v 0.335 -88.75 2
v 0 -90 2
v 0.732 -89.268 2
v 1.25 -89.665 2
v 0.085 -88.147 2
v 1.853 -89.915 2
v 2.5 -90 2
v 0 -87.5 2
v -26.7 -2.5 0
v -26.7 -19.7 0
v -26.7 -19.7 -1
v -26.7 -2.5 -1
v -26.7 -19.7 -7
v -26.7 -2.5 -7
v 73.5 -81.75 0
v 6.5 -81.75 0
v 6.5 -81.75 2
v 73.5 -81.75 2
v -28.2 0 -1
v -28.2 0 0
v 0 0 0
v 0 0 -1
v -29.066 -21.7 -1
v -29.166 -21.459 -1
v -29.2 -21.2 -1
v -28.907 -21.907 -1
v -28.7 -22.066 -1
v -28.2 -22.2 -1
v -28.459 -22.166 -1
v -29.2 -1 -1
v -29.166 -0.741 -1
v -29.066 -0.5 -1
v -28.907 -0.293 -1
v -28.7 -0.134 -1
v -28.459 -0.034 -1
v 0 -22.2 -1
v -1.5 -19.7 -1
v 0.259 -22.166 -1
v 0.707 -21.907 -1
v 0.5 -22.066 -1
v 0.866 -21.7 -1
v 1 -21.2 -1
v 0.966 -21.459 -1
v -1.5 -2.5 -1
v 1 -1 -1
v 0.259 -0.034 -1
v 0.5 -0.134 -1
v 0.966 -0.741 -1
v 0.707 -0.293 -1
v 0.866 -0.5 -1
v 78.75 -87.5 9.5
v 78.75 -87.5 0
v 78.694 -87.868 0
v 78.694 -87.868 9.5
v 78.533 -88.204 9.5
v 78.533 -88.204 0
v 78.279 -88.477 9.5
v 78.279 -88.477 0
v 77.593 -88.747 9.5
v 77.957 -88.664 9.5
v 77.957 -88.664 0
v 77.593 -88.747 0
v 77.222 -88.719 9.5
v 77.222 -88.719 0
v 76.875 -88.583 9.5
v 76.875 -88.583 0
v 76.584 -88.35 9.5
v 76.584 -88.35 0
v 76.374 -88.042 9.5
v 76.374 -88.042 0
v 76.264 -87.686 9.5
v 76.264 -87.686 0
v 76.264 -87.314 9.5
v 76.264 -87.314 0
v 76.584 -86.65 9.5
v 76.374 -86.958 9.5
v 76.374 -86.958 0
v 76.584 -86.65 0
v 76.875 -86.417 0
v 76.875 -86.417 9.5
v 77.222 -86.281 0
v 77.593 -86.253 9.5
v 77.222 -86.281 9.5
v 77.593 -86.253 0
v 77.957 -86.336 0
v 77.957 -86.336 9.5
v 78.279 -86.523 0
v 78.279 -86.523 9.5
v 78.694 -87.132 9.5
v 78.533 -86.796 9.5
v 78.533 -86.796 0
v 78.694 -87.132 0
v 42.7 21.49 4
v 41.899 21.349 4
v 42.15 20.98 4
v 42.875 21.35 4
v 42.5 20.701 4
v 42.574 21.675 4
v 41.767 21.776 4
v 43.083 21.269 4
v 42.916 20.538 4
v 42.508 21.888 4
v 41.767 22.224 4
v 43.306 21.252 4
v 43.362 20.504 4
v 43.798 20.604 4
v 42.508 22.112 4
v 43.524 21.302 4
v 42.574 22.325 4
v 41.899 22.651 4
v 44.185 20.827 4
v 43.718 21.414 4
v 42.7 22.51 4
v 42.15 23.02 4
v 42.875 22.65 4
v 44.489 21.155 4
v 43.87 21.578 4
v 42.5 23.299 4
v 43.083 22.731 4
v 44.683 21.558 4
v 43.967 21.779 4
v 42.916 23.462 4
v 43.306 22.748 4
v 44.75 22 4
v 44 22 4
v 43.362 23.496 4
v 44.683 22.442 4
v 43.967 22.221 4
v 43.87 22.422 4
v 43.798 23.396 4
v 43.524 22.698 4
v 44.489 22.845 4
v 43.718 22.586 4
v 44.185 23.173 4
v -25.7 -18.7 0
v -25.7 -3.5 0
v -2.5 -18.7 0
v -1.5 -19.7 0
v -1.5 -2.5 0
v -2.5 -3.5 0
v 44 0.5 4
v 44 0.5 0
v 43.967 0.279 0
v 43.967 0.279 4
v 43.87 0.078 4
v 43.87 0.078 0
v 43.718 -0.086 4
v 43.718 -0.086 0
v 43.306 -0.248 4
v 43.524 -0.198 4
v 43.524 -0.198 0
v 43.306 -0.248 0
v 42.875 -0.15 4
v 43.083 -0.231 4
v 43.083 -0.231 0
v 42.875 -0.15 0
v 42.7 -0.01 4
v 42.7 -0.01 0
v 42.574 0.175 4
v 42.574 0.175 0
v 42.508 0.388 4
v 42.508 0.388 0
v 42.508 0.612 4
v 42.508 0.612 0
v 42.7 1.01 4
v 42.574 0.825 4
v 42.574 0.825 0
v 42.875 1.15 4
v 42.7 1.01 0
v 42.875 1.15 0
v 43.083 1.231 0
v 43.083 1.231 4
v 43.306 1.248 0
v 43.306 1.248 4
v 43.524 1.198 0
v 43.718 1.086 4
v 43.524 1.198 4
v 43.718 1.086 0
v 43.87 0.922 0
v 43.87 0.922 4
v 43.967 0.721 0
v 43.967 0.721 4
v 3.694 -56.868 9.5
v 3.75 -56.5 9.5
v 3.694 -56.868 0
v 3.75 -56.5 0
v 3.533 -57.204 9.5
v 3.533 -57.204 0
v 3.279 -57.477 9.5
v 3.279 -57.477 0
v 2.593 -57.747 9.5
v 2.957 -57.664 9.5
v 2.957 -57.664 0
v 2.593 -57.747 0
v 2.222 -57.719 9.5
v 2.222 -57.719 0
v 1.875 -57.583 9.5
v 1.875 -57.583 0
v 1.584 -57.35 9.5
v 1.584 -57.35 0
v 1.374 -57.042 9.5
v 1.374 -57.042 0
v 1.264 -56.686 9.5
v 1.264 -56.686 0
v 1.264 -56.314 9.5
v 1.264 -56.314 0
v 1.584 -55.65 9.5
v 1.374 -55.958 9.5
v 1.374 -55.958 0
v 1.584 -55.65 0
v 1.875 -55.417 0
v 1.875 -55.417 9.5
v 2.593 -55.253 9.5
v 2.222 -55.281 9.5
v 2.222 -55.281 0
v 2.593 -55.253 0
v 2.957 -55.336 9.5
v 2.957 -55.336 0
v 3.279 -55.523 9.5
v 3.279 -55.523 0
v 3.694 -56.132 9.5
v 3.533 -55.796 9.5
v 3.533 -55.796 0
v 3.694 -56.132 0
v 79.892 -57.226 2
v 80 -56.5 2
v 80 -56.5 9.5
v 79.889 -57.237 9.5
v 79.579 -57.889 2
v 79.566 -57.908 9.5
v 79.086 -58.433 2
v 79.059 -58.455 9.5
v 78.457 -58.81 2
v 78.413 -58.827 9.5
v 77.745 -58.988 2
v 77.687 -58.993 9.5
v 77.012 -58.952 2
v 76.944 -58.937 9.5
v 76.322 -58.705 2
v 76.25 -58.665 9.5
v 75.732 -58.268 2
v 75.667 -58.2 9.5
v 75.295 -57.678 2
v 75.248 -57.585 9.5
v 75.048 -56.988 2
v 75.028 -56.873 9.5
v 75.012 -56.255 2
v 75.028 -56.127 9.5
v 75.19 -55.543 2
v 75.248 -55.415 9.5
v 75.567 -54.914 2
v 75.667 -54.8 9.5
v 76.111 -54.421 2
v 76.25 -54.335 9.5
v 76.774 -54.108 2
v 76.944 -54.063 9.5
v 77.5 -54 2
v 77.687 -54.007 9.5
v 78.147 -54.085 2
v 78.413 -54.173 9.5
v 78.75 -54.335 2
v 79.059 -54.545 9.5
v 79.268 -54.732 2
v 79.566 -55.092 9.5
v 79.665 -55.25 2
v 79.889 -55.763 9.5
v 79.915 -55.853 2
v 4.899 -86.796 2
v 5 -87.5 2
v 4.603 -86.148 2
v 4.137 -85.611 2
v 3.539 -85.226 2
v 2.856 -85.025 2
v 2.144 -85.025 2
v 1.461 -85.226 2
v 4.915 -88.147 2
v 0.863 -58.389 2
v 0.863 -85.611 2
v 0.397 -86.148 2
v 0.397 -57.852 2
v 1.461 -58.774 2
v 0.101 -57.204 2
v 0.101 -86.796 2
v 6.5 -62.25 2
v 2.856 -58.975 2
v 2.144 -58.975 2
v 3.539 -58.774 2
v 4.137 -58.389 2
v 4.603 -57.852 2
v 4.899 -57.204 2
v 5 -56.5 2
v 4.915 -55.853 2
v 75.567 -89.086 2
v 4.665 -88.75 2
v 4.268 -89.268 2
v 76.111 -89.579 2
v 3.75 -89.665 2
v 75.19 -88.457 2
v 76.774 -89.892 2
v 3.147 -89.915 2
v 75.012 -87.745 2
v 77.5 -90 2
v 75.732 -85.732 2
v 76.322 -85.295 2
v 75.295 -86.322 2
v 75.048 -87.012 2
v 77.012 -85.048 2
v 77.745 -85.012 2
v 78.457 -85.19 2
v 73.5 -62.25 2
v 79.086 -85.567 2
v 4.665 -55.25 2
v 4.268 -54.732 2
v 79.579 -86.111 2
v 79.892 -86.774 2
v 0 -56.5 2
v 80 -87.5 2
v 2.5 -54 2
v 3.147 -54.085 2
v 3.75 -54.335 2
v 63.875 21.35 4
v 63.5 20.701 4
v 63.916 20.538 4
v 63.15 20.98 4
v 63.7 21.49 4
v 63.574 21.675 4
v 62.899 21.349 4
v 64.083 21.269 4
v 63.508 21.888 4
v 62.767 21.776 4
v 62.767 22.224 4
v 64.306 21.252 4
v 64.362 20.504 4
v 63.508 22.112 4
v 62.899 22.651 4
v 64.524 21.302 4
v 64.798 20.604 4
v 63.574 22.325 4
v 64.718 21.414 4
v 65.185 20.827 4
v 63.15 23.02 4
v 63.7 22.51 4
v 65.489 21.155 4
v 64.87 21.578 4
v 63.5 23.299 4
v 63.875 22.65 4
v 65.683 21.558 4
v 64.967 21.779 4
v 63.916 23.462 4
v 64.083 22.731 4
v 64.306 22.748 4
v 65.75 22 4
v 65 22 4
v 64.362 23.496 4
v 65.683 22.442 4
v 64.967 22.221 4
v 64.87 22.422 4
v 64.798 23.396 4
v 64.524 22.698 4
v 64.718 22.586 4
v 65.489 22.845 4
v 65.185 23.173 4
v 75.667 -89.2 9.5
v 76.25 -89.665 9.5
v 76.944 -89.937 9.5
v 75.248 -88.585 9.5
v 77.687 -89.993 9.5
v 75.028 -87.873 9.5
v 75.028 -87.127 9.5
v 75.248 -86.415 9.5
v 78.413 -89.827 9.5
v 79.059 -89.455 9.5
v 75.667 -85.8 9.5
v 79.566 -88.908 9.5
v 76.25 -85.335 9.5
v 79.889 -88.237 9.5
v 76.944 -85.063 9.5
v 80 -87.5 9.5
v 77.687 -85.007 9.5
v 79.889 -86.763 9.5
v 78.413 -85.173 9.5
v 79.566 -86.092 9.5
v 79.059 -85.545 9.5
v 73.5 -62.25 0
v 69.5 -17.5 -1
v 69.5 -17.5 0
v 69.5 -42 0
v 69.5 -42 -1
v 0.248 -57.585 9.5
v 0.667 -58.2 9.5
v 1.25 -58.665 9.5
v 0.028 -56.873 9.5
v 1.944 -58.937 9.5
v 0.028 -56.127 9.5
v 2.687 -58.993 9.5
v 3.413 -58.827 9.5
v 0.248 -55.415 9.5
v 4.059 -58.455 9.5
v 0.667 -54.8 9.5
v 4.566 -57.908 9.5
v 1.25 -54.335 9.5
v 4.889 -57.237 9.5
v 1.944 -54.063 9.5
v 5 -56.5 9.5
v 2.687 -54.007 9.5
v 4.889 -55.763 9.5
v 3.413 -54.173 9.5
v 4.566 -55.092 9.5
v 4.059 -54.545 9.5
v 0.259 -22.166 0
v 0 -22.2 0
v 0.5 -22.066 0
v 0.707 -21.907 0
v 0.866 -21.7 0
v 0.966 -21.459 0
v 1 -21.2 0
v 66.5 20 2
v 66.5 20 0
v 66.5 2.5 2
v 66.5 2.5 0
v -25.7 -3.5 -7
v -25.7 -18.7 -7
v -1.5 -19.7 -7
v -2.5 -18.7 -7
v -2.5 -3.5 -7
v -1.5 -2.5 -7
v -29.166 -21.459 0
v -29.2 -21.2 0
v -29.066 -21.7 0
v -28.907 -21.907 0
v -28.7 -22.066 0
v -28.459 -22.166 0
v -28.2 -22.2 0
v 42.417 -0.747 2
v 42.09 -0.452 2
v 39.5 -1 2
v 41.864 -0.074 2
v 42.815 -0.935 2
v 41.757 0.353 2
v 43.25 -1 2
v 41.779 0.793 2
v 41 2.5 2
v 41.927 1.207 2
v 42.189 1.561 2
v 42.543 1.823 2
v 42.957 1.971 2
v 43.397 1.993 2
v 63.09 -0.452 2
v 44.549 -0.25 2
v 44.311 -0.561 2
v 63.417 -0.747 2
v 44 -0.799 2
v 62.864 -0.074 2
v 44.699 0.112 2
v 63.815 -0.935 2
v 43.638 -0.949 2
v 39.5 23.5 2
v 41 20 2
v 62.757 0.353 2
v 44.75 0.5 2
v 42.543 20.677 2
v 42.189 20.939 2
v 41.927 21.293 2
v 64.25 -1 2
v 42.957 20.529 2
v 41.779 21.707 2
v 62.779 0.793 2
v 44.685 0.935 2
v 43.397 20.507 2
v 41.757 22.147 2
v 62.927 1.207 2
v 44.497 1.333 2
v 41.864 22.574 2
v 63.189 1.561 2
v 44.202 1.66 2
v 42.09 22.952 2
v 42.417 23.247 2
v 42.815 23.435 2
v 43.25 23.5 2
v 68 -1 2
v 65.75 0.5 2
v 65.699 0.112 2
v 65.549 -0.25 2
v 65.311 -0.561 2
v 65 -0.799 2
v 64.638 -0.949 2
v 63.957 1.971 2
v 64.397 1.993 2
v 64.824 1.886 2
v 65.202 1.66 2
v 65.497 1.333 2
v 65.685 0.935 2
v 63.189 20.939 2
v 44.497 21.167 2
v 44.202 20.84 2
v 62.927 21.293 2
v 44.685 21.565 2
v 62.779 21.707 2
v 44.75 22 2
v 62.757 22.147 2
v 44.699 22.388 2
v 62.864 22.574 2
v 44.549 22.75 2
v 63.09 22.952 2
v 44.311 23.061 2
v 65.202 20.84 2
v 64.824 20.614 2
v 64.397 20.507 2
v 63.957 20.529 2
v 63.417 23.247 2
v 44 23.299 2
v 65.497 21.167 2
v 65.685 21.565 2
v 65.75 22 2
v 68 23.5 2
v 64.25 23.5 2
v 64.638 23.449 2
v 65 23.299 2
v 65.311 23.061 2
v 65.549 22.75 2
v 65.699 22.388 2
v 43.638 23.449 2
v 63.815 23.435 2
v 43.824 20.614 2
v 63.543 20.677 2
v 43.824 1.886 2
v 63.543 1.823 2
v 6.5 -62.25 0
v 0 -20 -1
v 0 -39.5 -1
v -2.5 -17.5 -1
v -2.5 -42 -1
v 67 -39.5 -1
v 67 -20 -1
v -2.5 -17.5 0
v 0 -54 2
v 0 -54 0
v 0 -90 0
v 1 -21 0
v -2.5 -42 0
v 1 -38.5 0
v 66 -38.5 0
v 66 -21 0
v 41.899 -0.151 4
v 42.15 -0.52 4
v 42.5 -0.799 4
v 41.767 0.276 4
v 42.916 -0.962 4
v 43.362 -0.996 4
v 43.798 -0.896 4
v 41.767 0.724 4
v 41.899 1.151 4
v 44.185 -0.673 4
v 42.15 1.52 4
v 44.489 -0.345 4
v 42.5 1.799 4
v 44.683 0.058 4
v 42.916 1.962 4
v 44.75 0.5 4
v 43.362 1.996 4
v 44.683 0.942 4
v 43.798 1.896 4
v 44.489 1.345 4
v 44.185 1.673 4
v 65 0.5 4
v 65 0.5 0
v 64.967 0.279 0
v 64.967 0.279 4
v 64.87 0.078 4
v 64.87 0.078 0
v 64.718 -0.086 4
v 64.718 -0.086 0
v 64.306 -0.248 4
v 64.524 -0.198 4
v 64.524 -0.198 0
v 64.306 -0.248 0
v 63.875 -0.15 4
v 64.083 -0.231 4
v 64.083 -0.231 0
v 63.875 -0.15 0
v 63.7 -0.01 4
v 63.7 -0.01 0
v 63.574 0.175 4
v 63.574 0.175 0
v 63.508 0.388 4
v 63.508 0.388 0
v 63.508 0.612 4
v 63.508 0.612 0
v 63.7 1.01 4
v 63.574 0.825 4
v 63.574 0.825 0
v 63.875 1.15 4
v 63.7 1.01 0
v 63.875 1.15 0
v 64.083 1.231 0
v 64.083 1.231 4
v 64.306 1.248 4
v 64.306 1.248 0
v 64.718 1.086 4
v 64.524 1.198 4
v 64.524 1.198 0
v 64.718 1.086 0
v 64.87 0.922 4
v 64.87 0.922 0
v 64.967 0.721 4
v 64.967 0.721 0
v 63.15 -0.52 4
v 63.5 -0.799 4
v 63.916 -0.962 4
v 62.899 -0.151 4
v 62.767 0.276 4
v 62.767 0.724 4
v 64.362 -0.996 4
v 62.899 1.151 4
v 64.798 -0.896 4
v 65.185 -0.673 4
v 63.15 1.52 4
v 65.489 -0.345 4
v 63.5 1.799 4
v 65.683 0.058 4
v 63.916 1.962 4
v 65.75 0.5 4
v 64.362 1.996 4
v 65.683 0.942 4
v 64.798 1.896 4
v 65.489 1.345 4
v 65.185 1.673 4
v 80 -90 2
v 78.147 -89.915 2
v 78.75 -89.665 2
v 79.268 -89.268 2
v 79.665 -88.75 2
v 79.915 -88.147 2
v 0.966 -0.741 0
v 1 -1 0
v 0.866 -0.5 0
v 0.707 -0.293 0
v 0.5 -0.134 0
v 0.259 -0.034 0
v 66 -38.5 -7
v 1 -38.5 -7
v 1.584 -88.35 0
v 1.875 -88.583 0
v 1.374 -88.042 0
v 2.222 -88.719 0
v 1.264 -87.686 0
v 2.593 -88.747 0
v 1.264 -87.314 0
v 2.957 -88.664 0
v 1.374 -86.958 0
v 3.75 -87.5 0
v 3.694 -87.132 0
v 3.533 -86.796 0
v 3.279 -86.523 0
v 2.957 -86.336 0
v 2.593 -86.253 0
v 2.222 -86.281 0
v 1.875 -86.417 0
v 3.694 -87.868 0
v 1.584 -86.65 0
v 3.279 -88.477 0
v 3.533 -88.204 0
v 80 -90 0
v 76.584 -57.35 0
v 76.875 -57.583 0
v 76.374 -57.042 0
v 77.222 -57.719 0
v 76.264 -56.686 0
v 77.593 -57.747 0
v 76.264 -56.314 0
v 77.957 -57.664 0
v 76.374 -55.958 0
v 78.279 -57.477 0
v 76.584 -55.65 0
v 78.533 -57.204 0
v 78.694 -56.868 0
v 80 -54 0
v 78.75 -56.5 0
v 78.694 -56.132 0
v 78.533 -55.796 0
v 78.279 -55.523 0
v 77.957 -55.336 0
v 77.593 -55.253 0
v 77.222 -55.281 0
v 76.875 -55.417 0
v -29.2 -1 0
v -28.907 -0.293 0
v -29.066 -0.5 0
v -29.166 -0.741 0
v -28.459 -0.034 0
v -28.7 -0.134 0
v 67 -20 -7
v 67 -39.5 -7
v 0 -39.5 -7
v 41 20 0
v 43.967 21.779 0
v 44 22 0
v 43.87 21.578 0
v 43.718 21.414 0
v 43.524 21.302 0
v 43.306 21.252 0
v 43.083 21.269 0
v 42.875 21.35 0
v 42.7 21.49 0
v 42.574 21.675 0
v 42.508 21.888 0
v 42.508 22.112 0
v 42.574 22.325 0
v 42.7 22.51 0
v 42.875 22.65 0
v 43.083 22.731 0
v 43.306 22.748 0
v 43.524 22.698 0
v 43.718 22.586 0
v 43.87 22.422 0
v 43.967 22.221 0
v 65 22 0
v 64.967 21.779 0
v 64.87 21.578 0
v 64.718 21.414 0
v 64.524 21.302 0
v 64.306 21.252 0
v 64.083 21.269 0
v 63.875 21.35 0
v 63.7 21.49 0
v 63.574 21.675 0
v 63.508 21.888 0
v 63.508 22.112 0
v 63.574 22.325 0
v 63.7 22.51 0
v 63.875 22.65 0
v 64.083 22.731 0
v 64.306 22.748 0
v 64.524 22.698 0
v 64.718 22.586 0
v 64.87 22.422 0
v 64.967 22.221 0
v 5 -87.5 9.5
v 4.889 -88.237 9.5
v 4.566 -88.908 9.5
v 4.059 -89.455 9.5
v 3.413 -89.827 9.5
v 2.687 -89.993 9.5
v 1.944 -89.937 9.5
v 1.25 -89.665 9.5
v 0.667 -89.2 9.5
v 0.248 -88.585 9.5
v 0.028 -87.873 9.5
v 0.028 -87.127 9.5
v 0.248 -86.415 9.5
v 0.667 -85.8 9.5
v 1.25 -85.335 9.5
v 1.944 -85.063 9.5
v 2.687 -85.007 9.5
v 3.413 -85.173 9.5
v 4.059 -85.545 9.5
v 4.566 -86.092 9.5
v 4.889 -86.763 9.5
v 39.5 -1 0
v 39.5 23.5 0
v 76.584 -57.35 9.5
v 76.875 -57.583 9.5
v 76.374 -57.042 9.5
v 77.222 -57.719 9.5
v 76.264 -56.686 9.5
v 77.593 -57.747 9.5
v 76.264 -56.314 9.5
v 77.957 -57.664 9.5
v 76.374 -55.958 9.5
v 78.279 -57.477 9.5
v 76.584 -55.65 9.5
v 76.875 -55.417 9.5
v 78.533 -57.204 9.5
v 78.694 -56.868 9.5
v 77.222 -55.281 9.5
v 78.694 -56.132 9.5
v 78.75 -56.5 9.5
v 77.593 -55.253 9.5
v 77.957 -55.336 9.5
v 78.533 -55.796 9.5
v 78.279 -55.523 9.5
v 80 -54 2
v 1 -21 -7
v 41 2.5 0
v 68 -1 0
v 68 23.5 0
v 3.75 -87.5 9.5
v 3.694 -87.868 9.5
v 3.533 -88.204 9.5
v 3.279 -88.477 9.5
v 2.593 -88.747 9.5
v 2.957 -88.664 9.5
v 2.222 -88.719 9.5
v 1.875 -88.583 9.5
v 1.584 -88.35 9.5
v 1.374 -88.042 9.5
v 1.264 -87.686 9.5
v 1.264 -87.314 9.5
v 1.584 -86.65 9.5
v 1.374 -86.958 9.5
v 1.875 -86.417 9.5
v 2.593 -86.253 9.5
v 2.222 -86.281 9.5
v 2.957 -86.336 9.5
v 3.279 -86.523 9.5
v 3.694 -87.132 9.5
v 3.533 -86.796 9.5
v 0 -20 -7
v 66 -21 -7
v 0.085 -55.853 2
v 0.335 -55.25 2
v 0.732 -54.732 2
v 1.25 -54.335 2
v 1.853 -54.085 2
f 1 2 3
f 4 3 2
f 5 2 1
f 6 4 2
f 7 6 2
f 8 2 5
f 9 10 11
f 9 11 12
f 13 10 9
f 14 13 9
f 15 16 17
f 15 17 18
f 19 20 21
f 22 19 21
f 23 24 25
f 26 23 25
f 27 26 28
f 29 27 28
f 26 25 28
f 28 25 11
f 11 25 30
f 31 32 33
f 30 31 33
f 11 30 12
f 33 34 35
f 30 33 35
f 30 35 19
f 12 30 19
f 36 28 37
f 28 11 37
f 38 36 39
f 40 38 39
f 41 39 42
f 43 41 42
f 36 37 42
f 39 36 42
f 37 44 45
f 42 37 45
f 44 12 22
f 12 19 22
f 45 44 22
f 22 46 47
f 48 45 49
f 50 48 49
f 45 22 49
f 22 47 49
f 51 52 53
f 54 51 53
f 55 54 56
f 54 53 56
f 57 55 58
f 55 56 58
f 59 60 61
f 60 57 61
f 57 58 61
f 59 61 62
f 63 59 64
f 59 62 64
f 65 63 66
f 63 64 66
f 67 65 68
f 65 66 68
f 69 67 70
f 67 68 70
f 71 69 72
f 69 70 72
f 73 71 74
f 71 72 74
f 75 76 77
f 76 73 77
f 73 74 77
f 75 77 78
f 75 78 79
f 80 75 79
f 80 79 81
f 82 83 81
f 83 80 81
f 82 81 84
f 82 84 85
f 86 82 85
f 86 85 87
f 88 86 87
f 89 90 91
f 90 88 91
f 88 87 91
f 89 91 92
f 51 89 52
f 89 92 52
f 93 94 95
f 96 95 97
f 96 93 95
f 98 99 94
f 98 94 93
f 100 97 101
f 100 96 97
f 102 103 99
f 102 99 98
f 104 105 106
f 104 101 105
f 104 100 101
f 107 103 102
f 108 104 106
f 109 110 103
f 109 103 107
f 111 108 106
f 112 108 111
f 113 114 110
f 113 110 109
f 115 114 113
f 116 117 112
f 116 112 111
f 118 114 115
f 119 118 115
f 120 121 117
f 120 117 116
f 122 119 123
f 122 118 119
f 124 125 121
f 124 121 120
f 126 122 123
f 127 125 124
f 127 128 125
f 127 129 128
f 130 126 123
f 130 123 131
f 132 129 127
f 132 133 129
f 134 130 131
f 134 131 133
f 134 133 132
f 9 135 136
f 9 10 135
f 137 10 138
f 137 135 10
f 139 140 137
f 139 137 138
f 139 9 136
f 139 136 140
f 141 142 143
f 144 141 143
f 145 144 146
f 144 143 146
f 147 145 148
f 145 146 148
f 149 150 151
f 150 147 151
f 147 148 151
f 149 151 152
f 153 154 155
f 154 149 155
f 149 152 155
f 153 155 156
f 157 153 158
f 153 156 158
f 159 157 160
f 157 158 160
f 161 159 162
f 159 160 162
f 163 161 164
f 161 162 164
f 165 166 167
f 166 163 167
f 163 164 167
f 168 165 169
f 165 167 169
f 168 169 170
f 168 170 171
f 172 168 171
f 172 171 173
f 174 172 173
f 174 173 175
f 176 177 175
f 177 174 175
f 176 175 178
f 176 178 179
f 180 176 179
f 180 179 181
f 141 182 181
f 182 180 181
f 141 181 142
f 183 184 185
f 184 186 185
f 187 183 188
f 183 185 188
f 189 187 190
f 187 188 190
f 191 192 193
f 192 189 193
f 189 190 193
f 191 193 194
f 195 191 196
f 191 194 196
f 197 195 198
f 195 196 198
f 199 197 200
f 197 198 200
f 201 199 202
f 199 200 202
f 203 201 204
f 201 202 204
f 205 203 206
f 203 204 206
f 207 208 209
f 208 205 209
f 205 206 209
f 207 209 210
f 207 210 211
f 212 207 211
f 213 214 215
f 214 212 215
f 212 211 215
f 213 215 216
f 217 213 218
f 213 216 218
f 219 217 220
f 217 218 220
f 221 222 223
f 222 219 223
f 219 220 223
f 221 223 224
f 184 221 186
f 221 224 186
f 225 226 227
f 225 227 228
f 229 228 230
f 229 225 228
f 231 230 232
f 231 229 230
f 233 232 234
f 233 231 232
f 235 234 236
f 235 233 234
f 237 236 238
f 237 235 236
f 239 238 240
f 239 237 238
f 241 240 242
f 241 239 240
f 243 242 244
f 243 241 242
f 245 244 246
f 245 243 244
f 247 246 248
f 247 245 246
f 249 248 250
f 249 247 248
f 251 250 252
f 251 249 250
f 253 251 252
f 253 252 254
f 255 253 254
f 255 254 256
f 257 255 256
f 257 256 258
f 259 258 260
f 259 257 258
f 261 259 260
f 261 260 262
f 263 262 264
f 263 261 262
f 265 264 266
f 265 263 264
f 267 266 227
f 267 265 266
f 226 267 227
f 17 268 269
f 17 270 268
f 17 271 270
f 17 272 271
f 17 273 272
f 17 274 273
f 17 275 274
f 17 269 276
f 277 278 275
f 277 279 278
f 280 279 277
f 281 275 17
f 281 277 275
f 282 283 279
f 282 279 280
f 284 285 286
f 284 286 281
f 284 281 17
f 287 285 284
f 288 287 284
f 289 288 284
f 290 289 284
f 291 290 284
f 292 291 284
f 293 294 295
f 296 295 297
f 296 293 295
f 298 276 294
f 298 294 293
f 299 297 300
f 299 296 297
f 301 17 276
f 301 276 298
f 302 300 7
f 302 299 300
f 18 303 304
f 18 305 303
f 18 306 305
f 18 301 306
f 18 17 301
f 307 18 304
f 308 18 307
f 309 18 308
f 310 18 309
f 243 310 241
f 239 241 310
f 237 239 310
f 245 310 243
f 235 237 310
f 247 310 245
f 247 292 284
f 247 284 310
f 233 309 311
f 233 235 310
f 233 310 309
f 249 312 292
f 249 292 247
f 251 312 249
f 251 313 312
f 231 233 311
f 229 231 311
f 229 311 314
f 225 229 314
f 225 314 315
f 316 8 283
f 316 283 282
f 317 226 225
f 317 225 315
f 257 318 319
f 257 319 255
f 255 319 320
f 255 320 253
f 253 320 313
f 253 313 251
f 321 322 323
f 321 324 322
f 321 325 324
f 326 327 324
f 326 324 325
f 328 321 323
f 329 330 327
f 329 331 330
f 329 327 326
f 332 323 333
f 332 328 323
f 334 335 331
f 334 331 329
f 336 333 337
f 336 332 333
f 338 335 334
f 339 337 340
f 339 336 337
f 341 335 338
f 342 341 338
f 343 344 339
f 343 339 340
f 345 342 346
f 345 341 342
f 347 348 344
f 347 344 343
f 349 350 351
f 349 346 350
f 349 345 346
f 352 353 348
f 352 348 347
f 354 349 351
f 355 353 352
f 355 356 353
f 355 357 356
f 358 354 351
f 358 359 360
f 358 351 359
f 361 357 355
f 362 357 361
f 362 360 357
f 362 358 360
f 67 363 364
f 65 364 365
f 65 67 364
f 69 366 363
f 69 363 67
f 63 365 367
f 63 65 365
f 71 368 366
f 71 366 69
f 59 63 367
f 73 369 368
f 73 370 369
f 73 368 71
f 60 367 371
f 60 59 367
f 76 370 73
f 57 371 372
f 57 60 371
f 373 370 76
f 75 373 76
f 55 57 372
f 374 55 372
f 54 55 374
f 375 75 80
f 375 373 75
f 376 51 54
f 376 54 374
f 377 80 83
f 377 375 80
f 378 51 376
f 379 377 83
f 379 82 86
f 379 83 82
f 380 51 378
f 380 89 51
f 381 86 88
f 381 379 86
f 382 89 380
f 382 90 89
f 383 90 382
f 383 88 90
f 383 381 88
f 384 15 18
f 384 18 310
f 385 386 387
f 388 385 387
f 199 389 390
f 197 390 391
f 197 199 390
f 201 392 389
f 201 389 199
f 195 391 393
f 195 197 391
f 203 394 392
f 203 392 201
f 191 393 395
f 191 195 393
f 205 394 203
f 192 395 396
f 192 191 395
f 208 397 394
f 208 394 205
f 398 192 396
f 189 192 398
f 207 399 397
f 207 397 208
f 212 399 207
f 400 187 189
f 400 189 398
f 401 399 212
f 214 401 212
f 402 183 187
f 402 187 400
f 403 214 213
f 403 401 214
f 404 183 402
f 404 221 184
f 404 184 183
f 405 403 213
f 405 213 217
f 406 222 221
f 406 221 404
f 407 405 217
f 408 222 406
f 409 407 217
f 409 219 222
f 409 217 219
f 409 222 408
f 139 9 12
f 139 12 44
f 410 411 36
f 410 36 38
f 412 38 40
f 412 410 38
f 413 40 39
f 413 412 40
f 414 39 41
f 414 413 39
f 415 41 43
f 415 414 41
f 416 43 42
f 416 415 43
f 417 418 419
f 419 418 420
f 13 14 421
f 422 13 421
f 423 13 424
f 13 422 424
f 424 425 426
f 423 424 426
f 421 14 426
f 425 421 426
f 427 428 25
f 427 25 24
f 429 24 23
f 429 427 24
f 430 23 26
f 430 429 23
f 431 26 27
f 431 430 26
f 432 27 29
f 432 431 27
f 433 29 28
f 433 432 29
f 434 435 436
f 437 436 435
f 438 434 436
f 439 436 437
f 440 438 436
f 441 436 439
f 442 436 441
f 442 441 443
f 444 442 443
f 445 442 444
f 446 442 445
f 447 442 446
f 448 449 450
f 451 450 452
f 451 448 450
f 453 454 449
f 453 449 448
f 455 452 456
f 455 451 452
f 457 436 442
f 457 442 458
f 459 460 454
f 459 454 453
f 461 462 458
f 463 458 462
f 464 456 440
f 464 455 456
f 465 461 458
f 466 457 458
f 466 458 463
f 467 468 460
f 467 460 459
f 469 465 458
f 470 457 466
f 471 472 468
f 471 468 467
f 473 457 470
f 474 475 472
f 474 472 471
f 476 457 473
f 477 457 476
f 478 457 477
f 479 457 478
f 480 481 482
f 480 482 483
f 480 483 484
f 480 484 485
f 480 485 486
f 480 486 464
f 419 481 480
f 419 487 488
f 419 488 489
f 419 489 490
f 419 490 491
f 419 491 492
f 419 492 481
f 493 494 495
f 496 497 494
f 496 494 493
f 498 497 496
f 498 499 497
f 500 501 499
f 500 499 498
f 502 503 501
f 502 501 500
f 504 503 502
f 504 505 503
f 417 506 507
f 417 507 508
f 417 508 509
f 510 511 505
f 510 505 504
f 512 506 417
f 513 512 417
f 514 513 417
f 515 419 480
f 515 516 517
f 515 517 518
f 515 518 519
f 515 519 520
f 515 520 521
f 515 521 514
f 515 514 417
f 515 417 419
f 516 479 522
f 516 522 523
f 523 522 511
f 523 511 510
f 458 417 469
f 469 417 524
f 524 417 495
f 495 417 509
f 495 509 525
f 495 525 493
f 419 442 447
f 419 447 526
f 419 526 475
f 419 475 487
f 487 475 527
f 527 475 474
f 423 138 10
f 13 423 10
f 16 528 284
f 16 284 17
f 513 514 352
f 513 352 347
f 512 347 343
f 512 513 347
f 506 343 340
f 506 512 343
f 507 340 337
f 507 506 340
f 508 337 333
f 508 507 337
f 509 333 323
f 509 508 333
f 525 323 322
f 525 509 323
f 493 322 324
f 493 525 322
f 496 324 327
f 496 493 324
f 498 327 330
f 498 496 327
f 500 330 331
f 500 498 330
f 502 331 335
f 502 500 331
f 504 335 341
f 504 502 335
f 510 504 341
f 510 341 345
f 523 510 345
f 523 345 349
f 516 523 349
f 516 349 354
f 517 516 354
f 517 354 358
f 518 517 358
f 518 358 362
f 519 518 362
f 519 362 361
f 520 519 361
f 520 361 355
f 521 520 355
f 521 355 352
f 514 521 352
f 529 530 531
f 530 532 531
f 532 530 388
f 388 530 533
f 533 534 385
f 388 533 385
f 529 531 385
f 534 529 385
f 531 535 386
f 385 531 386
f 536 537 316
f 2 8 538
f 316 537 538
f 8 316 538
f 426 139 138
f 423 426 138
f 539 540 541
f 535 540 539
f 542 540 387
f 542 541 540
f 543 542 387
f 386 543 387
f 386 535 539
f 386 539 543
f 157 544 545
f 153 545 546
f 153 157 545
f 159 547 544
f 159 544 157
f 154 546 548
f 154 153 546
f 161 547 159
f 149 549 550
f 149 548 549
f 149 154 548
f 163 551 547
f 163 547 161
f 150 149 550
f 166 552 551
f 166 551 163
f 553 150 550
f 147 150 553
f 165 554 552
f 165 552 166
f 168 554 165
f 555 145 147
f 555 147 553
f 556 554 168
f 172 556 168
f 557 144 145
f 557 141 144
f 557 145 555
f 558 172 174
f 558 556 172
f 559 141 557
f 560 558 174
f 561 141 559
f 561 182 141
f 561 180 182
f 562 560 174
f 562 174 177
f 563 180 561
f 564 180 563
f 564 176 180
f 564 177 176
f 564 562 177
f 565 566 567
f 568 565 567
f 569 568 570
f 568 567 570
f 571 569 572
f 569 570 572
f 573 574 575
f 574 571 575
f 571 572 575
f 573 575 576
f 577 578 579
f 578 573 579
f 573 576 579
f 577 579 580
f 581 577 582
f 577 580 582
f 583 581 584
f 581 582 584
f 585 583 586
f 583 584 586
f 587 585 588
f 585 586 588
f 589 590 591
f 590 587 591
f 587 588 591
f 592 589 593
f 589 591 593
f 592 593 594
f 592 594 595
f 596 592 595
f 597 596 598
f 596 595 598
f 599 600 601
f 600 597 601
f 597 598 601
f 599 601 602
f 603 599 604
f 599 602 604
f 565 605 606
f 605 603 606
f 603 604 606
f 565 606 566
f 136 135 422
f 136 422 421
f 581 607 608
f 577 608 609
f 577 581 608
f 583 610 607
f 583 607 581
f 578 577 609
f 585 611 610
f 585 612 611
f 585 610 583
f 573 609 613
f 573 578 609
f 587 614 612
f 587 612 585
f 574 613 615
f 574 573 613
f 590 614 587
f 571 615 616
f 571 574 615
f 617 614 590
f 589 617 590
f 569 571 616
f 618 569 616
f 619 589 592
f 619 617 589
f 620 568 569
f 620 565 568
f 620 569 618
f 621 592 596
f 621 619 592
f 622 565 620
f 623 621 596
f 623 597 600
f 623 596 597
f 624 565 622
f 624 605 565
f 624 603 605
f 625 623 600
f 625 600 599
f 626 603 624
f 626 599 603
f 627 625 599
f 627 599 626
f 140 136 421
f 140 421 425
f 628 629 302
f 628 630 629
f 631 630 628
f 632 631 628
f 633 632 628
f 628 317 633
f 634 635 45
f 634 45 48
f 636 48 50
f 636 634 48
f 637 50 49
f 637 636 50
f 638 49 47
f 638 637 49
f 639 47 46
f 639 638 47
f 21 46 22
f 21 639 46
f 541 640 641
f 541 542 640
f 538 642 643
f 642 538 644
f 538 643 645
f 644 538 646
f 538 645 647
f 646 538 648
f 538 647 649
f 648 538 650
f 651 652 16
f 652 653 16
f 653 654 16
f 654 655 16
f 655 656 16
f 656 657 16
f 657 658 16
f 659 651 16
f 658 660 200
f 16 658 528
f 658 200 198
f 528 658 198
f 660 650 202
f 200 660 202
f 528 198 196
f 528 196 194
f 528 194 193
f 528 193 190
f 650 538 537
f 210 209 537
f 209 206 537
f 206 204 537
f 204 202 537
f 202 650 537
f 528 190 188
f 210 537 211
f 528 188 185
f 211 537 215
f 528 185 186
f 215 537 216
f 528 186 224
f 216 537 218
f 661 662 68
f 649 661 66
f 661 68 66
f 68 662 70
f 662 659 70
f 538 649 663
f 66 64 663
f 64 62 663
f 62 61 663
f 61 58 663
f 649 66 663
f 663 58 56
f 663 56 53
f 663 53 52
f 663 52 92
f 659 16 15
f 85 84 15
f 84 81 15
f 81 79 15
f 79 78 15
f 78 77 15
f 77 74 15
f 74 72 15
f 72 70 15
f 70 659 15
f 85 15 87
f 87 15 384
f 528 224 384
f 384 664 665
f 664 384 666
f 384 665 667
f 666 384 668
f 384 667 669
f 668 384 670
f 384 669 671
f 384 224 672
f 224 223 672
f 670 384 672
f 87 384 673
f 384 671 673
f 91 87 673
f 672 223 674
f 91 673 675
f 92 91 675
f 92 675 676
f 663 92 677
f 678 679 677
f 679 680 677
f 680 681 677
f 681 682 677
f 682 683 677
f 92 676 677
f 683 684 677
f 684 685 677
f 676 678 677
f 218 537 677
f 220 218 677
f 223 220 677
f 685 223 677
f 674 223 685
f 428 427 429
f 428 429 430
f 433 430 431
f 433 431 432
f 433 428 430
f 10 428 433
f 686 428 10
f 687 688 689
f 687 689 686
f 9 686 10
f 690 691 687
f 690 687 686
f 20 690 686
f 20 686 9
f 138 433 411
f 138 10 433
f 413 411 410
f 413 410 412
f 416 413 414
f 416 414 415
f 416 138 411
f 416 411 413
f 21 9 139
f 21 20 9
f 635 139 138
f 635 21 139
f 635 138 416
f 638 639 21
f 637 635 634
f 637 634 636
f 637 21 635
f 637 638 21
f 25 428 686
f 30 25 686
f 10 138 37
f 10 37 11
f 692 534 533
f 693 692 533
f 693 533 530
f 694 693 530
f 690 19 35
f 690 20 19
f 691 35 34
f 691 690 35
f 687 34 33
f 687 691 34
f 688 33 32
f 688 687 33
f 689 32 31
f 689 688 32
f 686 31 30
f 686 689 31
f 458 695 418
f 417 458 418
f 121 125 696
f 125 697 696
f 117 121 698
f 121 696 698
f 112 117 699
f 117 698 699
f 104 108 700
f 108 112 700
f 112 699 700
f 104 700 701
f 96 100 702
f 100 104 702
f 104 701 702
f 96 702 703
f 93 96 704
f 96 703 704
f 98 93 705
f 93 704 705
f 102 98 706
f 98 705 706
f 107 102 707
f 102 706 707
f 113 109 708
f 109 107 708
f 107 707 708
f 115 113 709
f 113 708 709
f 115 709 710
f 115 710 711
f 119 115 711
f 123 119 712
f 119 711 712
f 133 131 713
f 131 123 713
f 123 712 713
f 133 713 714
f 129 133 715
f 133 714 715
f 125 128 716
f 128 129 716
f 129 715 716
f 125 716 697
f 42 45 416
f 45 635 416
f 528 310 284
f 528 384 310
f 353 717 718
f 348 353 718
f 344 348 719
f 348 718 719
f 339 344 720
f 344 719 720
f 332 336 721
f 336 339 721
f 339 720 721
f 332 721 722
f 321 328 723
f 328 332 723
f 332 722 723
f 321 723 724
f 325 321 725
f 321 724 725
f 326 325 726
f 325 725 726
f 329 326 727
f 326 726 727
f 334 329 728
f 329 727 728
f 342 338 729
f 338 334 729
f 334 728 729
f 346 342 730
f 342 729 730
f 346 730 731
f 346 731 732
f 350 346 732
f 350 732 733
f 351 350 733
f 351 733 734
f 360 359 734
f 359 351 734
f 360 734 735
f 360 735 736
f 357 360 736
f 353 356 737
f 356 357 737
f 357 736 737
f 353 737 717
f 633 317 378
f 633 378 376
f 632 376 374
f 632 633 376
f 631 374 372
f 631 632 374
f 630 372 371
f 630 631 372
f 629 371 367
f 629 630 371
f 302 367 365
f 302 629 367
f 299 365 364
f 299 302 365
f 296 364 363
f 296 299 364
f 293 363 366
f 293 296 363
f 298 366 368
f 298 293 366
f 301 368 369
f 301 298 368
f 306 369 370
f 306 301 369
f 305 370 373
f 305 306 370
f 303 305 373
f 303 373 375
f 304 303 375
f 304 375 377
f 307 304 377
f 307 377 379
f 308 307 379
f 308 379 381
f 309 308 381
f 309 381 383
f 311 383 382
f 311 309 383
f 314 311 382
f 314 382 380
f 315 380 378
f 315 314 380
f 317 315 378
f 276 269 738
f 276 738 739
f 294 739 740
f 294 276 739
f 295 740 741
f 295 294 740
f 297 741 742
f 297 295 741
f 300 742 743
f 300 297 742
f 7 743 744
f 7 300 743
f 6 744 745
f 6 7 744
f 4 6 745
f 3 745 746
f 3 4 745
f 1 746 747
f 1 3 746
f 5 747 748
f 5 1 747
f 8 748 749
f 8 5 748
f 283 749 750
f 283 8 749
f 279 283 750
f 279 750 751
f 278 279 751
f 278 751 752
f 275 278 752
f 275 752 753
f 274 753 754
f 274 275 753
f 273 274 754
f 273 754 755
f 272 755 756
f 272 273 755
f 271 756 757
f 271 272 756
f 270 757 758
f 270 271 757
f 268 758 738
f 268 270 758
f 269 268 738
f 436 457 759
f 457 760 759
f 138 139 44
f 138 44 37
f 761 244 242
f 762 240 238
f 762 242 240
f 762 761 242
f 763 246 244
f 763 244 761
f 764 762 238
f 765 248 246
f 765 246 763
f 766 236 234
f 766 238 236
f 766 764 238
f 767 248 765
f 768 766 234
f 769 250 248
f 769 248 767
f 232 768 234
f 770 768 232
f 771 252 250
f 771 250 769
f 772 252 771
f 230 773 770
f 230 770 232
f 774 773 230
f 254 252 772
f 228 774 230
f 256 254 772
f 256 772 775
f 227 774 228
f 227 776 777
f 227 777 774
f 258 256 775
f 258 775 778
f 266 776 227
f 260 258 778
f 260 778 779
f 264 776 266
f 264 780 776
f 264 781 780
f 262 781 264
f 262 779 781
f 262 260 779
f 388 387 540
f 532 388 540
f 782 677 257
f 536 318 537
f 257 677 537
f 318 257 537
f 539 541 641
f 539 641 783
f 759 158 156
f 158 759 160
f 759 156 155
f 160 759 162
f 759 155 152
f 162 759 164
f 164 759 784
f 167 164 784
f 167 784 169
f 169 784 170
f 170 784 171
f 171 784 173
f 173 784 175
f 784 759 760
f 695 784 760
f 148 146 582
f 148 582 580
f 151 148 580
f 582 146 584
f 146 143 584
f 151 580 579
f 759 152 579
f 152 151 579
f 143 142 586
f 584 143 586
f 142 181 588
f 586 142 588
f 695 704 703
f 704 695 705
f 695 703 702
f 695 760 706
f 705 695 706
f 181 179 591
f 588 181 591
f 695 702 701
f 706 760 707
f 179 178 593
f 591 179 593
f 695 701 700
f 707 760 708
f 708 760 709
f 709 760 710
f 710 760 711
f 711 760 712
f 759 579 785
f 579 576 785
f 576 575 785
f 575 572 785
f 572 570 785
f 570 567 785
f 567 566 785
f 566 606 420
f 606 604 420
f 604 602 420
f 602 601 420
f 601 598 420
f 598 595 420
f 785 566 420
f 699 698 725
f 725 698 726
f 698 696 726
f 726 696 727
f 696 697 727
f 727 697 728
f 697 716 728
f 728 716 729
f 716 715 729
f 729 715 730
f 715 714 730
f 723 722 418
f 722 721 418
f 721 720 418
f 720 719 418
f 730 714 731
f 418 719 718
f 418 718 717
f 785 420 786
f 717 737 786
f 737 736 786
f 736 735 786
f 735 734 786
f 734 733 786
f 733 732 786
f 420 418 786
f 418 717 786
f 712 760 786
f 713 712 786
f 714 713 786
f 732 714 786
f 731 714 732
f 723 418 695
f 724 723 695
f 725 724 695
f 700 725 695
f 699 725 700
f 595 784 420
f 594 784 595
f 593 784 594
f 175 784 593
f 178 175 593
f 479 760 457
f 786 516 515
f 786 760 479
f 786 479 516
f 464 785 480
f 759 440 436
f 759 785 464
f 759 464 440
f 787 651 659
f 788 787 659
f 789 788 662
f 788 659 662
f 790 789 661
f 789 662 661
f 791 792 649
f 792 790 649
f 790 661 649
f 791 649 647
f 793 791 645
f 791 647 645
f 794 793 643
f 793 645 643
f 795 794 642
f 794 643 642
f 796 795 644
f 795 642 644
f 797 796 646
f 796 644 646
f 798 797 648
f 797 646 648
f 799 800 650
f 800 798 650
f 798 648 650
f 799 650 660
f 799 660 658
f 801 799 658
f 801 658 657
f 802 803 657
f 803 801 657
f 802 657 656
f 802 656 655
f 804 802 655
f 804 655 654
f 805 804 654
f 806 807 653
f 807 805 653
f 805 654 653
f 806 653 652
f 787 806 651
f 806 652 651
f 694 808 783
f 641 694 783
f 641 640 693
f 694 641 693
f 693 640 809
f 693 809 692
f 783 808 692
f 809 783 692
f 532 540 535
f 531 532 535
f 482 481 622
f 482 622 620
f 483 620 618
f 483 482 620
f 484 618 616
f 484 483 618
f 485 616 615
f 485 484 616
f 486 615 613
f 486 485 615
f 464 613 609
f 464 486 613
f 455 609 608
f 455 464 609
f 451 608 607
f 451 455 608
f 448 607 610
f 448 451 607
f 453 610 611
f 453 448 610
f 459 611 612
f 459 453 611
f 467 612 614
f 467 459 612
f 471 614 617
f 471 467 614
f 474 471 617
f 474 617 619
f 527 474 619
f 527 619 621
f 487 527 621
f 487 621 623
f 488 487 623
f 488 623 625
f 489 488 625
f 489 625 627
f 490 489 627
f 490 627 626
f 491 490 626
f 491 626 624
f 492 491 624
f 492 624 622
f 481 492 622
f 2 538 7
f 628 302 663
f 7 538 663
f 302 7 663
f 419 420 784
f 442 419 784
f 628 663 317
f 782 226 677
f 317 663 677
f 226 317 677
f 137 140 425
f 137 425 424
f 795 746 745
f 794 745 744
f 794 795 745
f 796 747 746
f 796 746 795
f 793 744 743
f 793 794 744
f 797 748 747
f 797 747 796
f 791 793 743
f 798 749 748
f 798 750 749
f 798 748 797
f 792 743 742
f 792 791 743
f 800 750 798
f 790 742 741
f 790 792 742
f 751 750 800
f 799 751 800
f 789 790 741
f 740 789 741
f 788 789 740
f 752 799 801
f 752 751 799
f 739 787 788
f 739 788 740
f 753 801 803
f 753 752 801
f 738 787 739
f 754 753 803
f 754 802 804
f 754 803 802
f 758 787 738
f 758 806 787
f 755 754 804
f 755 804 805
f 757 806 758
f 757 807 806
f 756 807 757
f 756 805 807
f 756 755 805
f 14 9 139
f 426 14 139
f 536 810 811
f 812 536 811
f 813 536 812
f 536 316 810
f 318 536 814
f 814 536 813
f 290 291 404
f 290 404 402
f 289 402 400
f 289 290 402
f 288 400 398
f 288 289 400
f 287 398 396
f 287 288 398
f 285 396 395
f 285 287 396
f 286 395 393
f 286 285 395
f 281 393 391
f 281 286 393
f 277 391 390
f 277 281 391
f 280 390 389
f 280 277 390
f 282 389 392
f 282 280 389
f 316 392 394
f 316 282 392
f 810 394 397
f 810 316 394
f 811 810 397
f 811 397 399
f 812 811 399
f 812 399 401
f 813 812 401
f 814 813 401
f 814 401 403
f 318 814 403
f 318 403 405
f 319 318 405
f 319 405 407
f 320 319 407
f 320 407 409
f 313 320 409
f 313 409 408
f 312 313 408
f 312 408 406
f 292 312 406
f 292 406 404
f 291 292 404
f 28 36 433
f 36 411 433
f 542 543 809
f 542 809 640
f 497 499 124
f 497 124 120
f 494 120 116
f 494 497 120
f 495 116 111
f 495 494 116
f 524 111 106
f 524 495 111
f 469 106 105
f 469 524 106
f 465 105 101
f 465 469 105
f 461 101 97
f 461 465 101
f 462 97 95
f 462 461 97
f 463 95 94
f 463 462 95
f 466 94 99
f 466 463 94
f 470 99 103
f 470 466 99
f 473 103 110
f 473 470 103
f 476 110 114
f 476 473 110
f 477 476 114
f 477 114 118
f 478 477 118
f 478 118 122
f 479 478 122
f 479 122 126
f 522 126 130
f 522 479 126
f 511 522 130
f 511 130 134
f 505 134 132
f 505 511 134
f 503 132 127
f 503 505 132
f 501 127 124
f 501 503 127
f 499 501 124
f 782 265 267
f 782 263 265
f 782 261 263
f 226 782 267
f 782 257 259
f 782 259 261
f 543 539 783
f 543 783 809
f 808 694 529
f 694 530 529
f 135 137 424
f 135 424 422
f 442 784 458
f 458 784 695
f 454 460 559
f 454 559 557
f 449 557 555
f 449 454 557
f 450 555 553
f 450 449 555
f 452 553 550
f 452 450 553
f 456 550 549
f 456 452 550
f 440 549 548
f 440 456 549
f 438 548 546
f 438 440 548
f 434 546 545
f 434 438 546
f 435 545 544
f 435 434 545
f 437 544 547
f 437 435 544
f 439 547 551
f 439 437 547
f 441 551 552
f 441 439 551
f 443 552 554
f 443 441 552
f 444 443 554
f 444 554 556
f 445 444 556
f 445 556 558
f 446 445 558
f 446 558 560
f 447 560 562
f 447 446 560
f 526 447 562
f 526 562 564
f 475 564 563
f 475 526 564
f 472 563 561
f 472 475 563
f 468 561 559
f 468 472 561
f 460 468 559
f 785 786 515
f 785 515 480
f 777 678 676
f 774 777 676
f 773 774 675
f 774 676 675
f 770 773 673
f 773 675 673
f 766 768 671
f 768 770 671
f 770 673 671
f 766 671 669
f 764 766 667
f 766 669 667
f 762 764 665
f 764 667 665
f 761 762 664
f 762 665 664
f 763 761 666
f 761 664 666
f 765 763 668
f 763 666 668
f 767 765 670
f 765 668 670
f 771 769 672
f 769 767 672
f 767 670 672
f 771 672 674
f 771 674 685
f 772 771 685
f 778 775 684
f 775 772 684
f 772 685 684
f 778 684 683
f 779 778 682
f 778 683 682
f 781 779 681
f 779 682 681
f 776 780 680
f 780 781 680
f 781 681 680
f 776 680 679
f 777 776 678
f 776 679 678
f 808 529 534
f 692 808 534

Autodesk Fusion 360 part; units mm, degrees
sketch "Sketch1" plane through (0, 0, 0) normal (0, 0, 1) x (1, 0, 0)
  line L0 (-26.7, -2.5) -> (-1.5, -2.5)
  line L1 (-1.5, -2.5) -> (-1.5, -19.7)
  line L2 (-1.5, -19.7) -> (-26.7, -19.7)
  line L3 (-26.7, -19.7) -> (-26.7, -2.5)
  line L4 (-2.5, -18.7) -> (-25.7, -18.7)
  line L5 (-25.7, -18.7) -> (-25.7, -3.5)
  line L6 (-25.7, -3.5) -> (-2.5, -3.5)
  line L7 (-2.5, -3.5) -> (-2.5, -18.7)
  line L8 (-29.2, -21.2) -> (-29.2, -1)
  line L9 (-28.2, 0) -> (0, 0)
  line L10 (1, -1) -> (1, -21.2)
  line L11 (0, -22.2) -> (-28.2, -22.2)
  arc A0 (1, -1) -> (0, 0) centre (0, -1) ccw
  arc A1 (0, -22.2) -> (1, -21.2) centre (0, -21.2) ccw
  arc A2 (-28.2, 0) -> (-29.2, -1) centre (-28.2, -1) ccw
  arc A3 (-29.2, -21.2) -> (-28.2, -22.2) centre (-28.2, -21.2) ccw
  dimension "d1" = 25.2
  dimension "d2" = 17.2
  dimension "d3" = 1
  dimension "d36" = 1
  dimension "d37" = 1
  dimension "d50" = 2.5
  dimension "d51" = 2.5
  dimension "d52" = 2.5
  dimension "d53" = 2.5
extrude "Extrude1" add sketch "Sketch1" against normal blind 7 contours L0 L1 L2 L3 makes body 1
extrude "Extrude2" add sketch "Sketch1" against normal blind 1 separate body contours L8 L9 L10 L11 A0 A1 A2 A3 makes body 2
sketch "Sketch2" plane through (0, 0, 0) normal (0, 0, 1) x (1, 0, 0)
  line L0 (41, 20) -> (66.5, 20)
  line L1 (66.5, 20) -> (66.5, 2.5)
  line L2 (66.5, 2.5) -> (41, 2.5)
  line L3 (41, 2.5) -> (41, 20)
  line L4 (70, -1) -> (37.5, -1)
  line L5 (37.5, -1) -> (37.5, 23.5)
  line L6 (37.5, 23.5) -> (70, 23.5)
  line L7 (70, 23.5) -> (70, -1)
  line L8 (37.5, 23.5) -> (39.5, 23.5)
  line L9 (39.5, 23.5) -> (39.5, -4.9544)
  line L10 (39.5, -4.9544) -> (37.5, -4.9544)
  line L11 (37.5, -4.9544) -> (37.5, 23.5)
  line L12 (70, 23.5) -> (68, 23.5)
  line L13 (68, 23.5) -> (68, -5.1657)
  line L14 (68, -5.1657) -> (70, -5.1657)
  line L15 (70, -5.1657) -> (70, 23.5)
  line L16 (40, 22) -> (66, 22) construction
  line L17 (40, 0.5) -> (65.989, 0.5) construction
  line L18 (43.25, -1.847) -> (43.25, 22.398) construction
  line L19 (64.25, 22.5565) -> (64.25, -1.9527) construction
  circle A0 centre (43.25, 22) radius 1.5
  circle A1 centre (64.25, 22) radius 1.5
  circle A2 centre (64.25, 0.5) radius 1.5
  circle A3 centre (43.25, 0.5) radius 1.5
  circle A4 centre (43.25, 22) radius 0.75
  circle A5 centre (64.25, 22) radius 0.75
  circle A6 centre (43.25, 0.5) radius 0.75
  circle A7 centre (64.25, 0.5) radius 0.75
  dimension "d9" = 25.5
  dimension "d10" = 17.5
  dimension "d11" = -3.5
  dimension "d14" = 2
  dimension "d15" = 2
  dimension "d20" = 2
  dimension "d21" = 2
  dimension "d22" = 2.25
  dimension "d23" = 2.25
  dimension "d24" = 3
  dimension "d25" = 3
  dimension "d26" = 3
  dimension "d27" = 3
  dimension "d38" = 1.5
  dimension "d39" = 1.5
  dimension "d40" = 1.5
  dimension "d41" = 1.5
extrude "Extrude3" add sketch "Sketch2" along normal blind 2 separate body contours L4 L6 L7 L12 L13 L15 | A1 | A0 | A3 | A2 | L4 L6 L9 L13 | L4 L5 L6 L8 L9 L11 | A4 | A5 | A6 | A7 makes body 3
extrude "Extrude4" cut sketch "Sketch2" along normal blind 6 contours L4 L5 L6 L8 L9 L11 bodies 3
extrude "Extrude5" cut sketch "Sketch2" along normal blind 6 contours L4 L13 L14 L15 | L4 L6 L7 L12 L13 L15 bodies 3
extrude "Extrude6" add sketch "Sketch2" along normal blind 4 contours A3 | A6 bodies 3
extrude "Extrude7" add sketch "Sketch2" along normal blind 4 contours A2 | A7 bodies 3
extrude "Extrude8" add sketch "Sketch2" along normal blind 4 contours A0 | A4 bodies 3
extrude "Extrude9" add sketch "Sketch2" along normal blind 4 contours A1 | A5 bodies 3
extrude "Extrude10" cut sketch "Sketch2" along normal blind 4 contours A6 bodies 3
extrude "Extrude11" cut sketch "Sketch2" along normal blind 4 contours A7 bodies 3
extrude "Extrude12" cut sketch "Sketch2" along normal blind 4 contours A4 bodies 3
extrude "Extrude13" cut sketch "Sketch2" along normal blind 4 contours A5 bodies 3
sketch "Sketch3" plane through (0, 0, 0) normal (0, 0, 1) x (1, 0, 0)
  line L0 (0, -20) -> (67, -20)
  line L1 (67, -20) -> (67, -39.5)
  line L2 (67, -39.5) -> (0, -39.5)
  line L3 (0, -39.5) -> (0, -20)
  line L4 (66, -38.5) -> (1, -38.5)
  line L5 (1, -38.5) -> (1, -21)
  line L6 (1, -21) -> (66, -21)
  line L7 (66, -21) -> (66, -38.5)
  line L8 (69.5, -42) -> (-2.5, -42)
  line L9 (-2.5, -42) -> (-2.5, -17.5)
  line L10 (-2.5, -17.5) -> (69.5, -17.5)
  line L11 (69.5, -17.5) -> (69.5, -42)
  dimension "d54" = 67
  dimension "d55" = 19.5
  dimension "d56" = 1
  dimension "d57" = -2.5
extrude "Extrude14" add sketch "Sketch3" against normal blind 7 separate body contours L0 L1 L2 L3 makes body 4
extrude "Extrude15" add sketch "Sketch3" against normal blind 1 contours L8 L9 L10 L11 bodies 4
sketch "Sketch5" plane through (0, 0, 0) normal (0, 0, 1) x (1, 0, 0)
  line L0 (0, -90) -> (80, -90)
  line L1 (80, -90) -> (80, -54)
  line L2 (80, -54) -> (0, -54)
  line L3 (0, -54) -> (0, -90)
  line L4 (6.5, -81.75) -> (73.5, -81.75)
  line L5 (73.5, -81.75) -> (73.5, -62.25)
  line L6 (73.5, -62.25) -> (6.5, -62.25)
  line L7 (6.5, -62.25) -> (6.5, -81.75)
  line L8 (0, -87.5) -> (80, -87.5) construction
  line L9 (0, -56.5) -> (80, -56.5) construction
  line L10 (2.5, -90) -> (2.5, -54) construction
  line L11 (77.5, -90) -> (77.5, -54) construction
  circle A0 centre (2.5, -87.5) radius 2.5
  circle A1 centre (77.5, -87.5) radius 2.5
  circle A2 centre (2.5, -56.5) radius 2.5
  circle A3 centre (77.5, -56.5) radius 2.5
  circle A4 centre (2.5, -87.5) radius 1.25
  circle A5 centre (77.5, -87.5) radius 1.25
  circle A6 centre (2.5, -56.5) radius 1.25
  circle A7 centre (77.5, -56.5) radius 1.25
  dimension "d62" = 80
  dimension "d63" = 36
  dimension "d64" = 67
  dimension "d65" = 19.5
  dimension "d66" = 6.5
  dimension "d67" = 8.25
  dimension "d68" = 31
  dimension "d69" = 2.5
  dimension "d70" = 75
  dimension "d71" = 2.5
  dimension "d72" = 5
  dimension "d73" = 5
  dimension "d74" = 5
  dimension "d75" = 5
  dimension "d76" = 2.5
  dimension "d77" = 2.5
  dimension "d78" = 2.5
  dimension "d79" = 2.5
extrude "Extrude16" add sketch "Sketch5" along normal blind 2 separate body contours L0 L3 A0 | L0 L1 L2 L3 A0 A1 A2 A3 | L0 L1 A1 | L2 L3 A2 | L1 L2 A3 makes body 5 at (51.1667, -85.7467, 0)
extrude "Extrude17" add sketch "Sketch5" along normal blind 9.5 contours A0 | A1 | A2 | A3 bodies 5
